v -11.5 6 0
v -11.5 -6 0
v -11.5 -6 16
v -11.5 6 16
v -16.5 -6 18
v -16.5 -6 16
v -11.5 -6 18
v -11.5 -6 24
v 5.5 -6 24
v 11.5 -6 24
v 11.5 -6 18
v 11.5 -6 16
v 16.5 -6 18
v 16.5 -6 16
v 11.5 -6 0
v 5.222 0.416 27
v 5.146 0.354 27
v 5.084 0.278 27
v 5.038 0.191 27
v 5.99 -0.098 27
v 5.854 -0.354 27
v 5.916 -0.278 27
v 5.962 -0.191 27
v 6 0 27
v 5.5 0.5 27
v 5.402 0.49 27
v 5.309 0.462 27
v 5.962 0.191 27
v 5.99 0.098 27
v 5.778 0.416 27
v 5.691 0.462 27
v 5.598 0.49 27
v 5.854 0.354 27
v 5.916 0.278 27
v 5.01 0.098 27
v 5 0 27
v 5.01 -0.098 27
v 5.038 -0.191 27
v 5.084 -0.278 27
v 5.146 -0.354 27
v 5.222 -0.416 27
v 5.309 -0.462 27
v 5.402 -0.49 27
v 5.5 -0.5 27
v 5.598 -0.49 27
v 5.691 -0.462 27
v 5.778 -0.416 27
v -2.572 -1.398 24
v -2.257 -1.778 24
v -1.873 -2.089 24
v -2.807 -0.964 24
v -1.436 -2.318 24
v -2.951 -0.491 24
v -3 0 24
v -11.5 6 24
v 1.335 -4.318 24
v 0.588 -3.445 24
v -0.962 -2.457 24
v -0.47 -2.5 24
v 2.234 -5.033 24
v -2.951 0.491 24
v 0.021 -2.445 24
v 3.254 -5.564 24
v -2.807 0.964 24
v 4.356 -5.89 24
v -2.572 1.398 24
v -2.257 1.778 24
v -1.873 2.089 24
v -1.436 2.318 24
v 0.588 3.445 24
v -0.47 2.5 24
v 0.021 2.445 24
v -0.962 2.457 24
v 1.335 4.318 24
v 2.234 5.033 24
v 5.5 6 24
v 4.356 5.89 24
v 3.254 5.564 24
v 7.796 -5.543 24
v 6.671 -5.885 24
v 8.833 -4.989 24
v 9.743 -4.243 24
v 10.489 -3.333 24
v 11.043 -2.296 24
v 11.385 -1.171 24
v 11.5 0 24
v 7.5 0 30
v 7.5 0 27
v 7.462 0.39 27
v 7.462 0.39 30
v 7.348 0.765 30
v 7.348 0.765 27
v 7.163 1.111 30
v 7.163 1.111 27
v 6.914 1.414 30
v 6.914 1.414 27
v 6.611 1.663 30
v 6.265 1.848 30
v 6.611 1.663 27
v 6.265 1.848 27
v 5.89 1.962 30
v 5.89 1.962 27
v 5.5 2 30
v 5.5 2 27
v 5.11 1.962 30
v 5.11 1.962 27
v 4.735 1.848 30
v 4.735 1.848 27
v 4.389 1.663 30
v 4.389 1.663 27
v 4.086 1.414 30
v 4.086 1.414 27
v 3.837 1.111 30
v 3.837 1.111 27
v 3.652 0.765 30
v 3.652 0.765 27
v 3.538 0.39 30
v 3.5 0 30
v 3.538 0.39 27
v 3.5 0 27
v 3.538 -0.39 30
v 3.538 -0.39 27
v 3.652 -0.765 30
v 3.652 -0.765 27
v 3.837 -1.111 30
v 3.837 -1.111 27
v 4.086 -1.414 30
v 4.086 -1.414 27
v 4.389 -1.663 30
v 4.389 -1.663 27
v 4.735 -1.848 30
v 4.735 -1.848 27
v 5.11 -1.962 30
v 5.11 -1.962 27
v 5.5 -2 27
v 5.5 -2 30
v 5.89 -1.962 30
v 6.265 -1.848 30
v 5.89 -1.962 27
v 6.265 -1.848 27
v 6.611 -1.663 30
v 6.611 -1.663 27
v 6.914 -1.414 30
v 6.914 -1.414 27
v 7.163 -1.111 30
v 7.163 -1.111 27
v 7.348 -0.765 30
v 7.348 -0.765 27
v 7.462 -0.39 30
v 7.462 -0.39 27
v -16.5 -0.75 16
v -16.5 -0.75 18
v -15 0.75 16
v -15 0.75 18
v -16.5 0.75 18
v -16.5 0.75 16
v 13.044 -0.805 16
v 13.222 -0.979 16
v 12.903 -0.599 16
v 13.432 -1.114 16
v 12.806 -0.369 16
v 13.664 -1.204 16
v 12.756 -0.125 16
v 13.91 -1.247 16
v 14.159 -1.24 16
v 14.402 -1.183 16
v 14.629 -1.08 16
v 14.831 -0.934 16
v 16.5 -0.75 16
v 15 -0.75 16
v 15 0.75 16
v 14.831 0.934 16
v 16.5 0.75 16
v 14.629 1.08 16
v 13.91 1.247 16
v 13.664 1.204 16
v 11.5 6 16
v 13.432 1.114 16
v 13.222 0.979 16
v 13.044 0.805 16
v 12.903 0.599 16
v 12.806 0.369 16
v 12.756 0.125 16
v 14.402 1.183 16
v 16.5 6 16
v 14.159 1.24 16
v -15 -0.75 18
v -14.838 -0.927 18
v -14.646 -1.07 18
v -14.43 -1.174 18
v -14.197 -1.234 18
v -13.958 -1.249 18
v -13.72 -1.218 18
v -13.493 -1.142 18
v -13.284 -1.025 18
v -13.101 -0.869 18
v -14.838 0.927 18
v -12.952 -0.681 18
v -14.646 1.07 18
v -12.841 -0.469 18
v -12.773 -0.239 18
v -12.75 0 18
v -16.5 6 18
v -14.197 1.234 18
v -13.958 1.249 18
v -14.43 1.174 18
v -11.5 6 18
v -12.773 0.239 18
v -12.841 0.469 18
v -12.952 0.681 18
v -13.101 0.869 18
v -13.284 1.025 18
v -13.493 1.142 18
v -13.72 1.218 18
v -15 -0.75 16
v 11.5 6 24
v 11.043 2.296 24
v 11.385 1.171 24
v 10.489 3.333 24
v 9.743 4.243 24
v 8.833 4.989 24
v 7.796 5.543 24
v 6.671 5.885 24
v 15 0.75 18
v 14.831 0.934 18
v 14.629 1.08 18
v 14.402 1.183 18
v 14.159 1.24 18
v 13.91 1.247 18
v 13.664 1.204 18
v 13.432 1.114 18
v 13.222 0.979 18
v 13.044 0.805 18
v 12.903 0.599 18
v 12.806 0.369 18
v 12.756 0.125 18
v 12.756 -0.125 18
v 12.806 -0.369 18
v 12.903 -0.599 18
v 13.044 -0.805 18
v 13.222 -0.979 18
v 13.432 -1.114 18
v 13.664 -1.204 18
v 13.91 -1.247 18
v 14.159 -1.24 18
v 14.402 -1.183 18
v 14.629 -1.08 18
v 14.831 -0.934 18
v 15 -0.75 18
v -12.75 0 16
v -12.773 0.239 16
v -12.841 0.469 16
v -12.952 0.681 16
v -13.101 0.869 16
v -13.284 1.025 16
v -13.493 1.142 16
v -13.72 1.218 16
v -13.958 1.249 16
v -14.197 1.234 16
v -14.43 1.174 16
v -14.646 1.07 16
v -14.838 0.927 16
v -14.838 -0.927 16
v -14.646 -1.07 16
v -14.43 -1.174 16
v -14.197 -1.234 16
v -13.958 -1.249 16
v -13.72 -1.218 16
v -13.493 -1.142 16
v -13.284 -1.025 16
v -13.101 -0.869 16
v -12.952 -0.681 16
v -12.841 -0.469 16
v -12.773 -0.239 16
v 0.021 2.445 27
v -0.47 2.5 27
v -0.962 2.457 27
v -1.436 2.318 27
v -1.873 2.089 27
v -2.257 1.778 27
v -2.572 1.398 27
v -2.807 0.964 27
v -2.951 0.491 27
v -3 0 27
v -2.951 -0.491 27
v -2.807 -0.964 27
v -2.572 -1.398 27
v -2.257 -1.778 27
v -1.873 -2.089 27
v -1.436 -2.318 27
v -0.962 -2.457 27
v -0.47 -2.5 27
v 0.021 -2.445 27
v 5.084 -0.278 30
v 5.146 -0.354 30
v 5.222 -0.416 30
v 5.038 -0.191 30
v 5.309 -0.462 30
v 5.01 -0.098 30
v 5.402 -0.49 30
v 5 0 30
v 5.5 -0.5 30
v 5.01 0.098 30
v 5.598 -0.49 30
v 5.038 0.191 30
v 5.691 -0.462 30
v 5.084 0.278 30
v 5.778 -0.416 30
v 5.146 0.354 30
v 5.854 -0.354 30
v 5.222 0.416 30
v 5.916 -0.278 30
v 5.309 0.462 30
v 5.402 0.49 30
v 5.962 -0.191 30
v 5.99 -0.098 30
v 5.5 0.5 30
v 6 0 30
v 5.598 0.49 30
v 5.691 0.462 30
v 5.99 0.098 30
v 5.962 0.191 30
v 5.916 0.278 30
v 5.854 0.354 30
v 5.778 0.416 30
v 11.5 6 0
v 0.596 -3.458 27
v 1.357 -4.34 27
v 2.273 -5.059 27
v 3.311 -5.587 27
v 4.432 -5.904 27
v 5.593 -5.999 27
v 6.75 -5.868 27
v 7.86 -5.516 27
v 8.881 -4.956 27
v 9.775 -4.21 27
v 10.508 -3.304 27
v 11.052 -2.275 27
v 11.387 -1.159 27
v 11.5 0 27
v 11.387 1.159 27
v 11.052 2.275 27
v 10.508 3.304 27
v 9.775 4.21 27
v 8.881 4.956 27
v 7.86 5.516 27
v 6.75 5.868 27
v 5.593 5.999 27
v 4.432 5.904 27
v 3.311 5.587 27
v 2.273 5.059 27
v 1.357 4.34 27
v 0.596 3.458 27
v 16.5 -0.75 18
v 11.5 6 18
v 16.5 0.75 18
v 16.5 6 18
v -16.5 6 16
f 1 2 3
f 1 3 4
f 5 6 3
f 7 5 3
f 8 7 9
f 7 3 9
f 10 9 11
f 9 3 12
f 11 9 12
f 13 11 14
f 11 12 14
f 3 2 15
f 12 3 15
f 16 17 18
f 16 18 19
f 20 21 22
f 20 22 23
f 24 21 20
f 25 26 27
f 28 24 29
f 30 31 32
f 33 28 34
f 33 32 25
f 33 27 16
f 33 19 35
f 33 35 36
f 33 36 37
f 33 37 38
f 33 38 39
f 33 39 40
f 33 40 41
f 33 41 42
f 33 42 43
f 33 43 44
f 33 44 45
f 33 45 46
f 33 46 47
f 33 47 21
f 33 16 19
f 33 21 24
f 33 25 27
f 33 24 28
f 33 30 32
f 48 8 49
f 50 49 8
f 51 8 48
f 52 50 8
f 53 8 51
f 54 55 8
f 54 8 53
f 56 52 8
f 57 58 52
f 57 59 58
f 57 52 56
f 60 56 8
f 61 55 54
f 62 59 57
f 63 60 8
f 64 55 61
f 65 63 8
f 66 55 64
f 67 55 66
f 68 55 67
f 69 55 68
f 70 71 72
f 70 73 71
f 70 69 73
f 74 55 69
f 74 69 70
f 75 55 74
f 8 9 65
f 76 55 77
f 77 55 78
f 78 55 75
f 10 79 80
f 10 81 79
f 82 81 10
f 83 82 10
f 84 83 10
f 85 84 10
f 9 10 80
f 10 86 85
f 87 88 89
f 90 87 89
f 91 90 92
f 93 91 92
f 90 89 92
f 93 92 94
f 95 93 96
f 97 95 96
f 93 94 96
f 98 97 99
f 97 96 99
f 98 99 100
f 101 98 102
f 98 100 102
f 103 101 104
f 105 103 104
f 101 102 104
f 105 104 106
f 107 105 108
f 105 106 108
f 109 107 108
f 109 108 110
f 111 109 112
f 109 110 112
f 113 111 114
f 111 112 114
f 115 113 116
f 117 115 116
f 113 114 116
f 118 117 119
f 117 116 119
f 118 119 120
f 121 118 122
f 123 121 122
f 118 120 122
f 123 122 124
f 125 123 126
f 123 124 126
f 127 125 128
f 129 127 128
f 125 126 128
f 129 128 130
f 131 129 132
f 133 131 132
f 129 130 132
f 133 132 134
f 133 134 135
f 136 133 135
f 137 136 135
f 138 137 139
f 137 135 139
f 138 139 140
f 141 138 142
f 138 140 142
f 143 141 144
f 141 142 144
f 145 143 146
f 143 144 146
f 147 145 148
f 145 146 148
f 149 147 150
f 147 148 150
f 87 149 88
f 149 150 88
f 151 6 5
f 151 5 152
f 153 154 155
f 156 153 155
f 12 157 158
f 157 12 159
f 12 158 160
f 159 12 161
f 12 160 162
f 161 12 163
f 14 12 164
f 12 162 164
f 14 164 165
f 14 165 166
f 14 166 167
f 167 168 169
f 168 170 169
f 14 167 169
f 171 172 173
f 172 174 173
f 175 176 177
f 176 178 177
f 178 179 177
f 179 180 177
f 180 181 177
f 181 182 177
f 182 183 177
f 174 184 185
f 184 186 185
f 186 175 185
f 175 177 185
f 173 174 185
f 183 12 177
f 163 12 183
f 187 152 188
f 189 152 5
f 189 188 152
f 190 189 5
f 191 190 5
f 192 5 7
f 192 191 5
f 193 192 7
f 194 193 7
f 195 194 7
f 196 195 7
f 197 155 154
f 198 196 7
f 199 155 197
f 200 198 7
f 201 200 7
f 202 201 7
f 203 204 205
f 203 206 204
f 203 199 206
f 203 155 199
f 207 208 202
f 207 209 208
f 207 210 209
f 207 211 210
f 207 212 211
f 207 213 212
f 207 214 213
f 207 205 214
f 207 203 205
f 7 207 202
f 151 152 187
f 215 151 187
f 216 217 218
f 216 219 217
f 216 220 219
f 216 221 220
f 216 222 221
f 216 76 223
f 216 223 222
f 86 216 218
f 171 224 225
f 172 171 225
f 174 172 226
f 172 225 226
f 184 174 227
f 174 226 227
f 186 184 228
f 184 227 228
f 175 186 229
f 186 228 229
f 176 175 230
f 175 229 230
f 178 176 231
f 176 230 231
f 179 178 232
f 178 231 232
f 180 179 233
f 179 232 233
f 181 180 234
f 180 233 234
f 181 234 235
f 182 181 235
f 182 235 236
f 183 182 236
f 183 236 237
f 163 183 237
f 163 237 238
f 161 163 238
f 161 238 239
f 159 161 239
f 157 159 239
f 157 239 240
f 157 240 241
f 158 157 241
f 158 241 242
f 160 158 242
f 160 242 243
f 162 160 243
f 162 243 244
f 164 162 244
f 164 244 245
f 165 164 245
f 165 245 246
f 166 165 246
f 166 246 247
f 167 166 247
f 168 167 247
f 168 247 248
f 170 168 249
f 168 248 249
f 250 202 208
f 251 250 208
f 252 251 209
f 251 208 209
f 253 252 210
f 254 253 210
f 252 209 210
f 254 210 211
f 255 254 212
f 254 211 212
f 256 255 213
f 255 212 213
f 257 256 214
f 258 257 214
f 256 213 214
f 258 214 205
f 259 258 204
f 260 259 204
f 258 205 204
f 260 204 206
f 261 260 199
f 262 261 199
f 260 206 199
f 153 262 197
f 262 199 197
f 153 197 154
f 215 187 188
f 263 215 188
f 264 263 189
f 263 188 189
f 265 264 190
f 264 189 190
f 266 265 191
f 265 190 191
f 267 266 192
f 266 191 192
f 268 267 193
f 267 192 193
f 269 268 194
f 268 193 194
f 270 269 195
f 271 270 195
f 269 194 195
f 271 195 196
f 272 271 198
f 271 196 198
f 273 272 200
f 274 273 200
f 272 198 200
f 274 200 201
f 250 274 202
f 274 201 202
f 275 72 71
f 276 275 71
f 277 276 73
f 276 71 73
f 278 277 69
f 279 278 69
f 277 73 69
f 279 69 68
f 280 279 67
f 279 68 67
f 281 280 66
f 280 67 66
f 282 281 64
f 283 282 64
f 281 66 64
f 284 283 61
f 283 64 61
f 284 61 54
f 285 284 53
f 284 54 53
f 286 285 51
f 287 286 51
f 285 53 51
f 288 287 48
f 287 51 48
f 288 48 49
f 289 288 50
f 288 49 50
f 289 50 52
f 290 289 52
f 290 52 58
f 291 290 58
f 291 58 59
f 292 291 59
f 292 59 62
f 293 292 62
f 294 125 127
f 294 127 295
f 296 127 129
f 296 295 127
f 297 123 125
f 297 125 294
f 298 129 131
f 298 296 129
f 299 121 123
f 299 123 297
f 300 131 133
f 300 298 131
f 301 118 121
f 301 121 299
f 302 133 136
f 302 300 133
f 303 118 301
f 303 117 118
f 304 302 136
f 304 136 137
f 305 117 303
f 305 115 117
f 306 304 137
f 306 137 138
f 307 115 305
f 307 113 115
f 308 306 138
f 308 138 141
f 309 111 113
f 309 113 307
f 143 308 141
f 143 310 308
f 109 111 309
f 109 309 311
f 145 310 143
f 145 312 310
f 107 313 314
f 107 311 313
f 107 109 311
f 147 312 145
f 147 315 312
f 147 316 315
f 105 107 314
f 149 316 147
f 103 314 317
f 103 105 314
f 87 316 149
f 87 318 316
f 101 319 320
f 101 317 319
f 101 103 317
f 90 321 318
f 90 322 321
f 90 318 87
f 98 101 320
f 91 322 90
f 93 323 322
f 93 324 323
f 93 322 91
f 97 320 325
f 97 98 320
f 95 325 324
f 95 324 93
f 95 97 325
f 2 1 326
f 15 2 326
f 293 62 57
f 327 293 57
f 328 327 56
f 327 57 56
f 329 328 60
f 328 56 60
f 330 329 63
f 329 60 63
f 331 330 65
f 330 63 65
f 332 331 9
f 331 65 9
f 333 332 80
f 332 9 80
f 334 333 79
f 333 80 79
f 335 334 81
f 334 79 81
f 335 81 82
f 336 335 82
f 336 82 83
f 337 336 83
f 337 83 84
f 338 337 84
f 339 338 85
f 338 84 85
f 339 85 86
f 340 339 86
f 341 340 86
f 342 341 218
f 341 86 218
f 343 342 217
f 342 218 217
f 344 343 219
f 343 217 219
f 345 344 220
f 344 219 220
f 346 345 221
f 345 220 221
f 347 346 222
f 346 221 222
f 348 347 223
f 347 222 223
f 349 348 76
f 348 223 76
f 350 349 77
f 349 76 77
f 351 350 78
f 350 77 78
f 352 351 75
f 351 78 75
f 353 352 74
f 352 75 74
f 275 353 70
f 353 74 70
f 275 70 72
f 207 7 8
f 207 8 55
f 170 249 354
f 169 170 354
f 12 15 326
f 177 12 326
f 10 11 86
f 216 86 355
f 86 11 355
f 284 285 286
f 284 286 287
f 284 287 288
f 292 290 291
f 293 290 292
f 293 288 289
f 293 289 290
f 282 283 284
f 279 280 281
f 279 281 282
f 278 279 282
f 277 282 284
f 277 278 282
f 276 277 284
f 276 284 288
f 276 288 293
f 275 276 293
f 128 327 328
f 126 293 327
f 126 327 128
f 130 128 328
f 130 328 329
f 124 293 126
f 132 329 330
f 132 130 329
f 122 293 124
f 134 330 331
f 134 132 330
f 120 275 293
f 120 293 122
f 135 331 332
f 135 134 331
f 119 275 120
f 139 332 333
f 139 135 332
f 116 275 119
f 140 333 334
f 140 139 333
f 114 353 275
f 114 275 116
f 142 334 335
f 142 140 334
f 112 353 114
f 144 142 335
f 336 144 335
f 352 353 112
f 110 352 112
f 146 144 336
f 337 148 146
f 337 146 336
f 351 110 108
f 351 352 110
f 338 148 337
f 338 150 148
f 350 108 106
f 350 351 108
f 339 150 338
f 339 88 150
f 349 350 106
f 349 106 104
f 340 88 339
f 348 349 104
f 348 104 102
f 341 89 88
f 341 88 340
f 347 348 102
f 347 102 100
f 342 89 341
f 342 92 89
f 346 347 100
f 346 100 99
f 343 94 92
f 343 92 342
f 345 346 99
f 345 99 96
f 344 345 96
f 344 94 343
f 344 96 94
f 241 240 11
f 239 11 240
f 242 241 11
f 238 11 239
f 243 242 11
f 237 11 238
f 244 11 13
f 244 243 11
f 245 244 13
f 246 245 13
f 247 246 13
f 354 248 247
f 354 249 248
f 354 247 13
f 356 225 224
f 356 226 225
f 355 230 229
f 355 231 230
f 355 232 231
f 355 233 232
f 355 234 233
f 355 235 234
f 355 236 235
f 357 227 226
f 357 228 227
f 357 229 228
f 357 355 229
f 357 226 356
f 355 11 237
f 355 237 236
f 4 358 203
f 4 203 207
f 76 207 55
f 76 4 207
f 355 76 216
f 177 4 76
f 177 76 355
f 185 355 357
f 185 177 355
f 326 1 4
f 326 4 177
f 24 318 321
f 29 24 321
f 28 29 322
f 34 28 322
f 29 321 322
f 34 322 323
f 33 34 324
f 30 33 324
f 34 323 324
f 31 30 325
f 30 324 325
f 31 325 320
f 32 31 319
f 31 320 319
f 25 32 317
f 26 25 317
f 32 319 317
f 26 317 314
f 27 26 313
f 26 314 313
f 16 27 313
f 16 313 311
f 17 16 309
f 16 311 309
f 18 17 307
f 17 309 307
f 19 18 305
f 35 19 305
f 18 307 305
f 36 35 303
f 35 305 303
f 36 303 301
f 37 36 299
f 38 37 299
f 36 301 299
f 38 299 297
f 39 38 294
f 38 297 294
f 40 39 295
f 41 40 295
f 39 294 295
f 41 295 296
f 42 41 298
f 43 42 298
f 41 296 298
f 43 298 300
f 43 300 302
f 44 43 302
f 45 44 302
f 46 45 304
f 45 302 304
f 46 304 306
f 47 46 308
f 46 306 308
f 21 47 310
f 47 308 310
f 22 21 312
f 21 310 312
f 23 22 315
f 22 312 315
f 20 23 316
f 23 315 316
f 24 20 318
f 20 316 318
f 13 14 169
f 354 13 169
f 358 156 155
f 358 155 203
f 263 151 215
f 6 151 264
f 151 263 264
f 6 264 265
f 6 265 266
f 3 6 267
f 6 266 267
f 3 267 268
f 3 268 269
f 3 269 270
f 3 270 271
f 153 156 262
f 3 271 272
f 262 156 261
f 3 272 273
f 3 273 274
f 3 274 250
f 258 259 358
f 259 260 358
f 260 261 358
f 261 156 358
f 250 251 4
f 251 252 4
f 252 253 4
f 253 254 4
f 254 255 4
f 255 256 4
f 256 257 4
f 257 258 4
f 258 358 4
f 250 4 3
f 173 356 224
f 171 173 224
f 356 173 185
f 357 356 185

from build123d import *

# Parameters (mm, degrees)
F0_W      = 23
F0_H      = 12
F1_DEPTH  = 16
F2_W      = 33
F2_H      = 12
F3_DEPTH  = 2
F4_W      = 23
F4_H      = 12
F5_DEPTH  = 6
F7_DEPTH  = 3
F8_R      = 2
F9_DEPTH  = 3
F11_DEPTH = 18.001
F12_R     = 0.5
F13_DEPTH = 3


with BuildPart() as f1:
    # F0 (on Top) → F1 (new body)
    with BuildSketch(Plane.XY):
        Rectangle(F0_W, F0_H)
    extrude(amount=F1_DEPTH)

    # F2 (on face) → F3 (join)
    with BuildSketch(Plane.XY.offset(16)):
        Rectangle(F2_W, F2_H)
    extrude(amount=F3_DEPTH)

    # F4 (on face) → F5 (join)
    with BuildSketch(Plane.XY.offset(18)):
        Rectangle(F4_W, F4_H)
    extrude(amount=F5_DEPTH)

    # F6 (on face) → F7 (join)
    with BuildSketch(Plane.XY.offset(24)):
        with BuildLine():
            ThreePointArc((0.0208333333, -2.4451447071), (6.75, -5.8683472972), (11.5, 0))
            ThreePointArc((11.5, 0), (6.75, 5.8683472972), (0.0208333333, 2.4451447071))
            ThreePointArc((0.0208333333, 2.4451447071), (1.4432039694, 1.572882174), (2, 0))
            ThreePointArc((2, 0), (1.4432039694, -1.572882174), (0.0208333333, -2.4451447071))
        make_face()
        with BuildLine():
            ThreePointArc((2, 0), (1.4432039694, 1.572882174), (0.0208333333, 2.4451447071))
            ThreePointArc((0.0208333333, 2.4451447071), (-0.5, 0), (0.0208333333, -2.4451447071))
            ThreePointArc((0.0208333333, -2.4451447071), (1.4432039694, -1.572882174), (2, 0))
        make_face()
        with BuildLine():
            ThreePointArc((0.0208333333, -2.4451447071), (-0.5, 0), (0.0208333333, 2.4451447071))
            ThreePointArc((0.0208333333, 2.4451447071), (-3, 0), (0.0208333333, -2.4451447071))
        make_face()
    extrude(amount=F7_DEPTH)

    # F8 (on face) → F9 (join)
    with BuildSketch(Plane.XY.offset(27)):
        with Locations((5.5, 0)):
            Circle(F8_R)
    extrude(amount=F9_DEPTH)

    # F10 (on face) → F11 (cut, through all)
    with BuildSketch(Plane.XY.offset(18)):
        with BuildLine():
            ThreePointArc((-15, -0.75), (-13.6047152925, -1.1858541226), (-12.75, 0))
            ThreePointArc((-12.75, 0), (-13.6047152925, 1.1858541226), (-15, 0.75))
            Line((-15, 0.75), (-15, -0.75))
        make_face()
        with BuildLine():
            Line((-15, -0.75), (-15, 0.75))
            ThreePointArc((-15, 0.75), (-15.25, 0), (-15, -0.75))
        make_face()
        with BuildLine():
            ThreePointArc((-15, -0.75), (-15.25, 0), (-15, 0.75))
            Line((-15, 0.75), (-16.5, 0.75))
            Line((-16.5, 0.75), (-16.5, -0.75))
            Line((-16.5, -0.75), (-15, -0.75))
        make_face()
        with BuildLine():
            ThreePointArc((15, -0.75), (15.1858541226, -0.3952847075), (15.25, 0))
            ThreePointArc((15.25, 0), (15.1858541226, 0.3952847075), (15, 0.75))
            Line((15, 0.75), (15, -0.75))
        make_face()
        with BuildLine():
            ThreePointArc((15, 0.75), (15.1858541226, 0.3952847075), (15.25, 0))
            ThreePointArc((15.25, 0), (15.1858541226, -0.3952847075), (15, -0.75))
            Line((15, -0.75), (16.5, -0.75))
            Line((16.5, -0.75), (16.5, 0.75))
            Line((16.5, 0.75), (15, 0.75))
        make_face()
        with BuildLine():
            Line((15, -0.75), (15, 0.75))
            ThreePointArc((15, 0.75), (12.75, 0), (15, -0.75))
        make_face()
    extrude(amount=-F11_DEPTH, mode=Mode.SUBTRACT)

    # F12 (on face) → F13 (cut)
    with BuildSketch(Plane.XY.offset(30)):
        with Locations((5.5, 0)):
            Circle(F12_R)
    extrude(amount=-F13_DEPTH, mode=Mode.SUBTRACT)


solid = f1.part
